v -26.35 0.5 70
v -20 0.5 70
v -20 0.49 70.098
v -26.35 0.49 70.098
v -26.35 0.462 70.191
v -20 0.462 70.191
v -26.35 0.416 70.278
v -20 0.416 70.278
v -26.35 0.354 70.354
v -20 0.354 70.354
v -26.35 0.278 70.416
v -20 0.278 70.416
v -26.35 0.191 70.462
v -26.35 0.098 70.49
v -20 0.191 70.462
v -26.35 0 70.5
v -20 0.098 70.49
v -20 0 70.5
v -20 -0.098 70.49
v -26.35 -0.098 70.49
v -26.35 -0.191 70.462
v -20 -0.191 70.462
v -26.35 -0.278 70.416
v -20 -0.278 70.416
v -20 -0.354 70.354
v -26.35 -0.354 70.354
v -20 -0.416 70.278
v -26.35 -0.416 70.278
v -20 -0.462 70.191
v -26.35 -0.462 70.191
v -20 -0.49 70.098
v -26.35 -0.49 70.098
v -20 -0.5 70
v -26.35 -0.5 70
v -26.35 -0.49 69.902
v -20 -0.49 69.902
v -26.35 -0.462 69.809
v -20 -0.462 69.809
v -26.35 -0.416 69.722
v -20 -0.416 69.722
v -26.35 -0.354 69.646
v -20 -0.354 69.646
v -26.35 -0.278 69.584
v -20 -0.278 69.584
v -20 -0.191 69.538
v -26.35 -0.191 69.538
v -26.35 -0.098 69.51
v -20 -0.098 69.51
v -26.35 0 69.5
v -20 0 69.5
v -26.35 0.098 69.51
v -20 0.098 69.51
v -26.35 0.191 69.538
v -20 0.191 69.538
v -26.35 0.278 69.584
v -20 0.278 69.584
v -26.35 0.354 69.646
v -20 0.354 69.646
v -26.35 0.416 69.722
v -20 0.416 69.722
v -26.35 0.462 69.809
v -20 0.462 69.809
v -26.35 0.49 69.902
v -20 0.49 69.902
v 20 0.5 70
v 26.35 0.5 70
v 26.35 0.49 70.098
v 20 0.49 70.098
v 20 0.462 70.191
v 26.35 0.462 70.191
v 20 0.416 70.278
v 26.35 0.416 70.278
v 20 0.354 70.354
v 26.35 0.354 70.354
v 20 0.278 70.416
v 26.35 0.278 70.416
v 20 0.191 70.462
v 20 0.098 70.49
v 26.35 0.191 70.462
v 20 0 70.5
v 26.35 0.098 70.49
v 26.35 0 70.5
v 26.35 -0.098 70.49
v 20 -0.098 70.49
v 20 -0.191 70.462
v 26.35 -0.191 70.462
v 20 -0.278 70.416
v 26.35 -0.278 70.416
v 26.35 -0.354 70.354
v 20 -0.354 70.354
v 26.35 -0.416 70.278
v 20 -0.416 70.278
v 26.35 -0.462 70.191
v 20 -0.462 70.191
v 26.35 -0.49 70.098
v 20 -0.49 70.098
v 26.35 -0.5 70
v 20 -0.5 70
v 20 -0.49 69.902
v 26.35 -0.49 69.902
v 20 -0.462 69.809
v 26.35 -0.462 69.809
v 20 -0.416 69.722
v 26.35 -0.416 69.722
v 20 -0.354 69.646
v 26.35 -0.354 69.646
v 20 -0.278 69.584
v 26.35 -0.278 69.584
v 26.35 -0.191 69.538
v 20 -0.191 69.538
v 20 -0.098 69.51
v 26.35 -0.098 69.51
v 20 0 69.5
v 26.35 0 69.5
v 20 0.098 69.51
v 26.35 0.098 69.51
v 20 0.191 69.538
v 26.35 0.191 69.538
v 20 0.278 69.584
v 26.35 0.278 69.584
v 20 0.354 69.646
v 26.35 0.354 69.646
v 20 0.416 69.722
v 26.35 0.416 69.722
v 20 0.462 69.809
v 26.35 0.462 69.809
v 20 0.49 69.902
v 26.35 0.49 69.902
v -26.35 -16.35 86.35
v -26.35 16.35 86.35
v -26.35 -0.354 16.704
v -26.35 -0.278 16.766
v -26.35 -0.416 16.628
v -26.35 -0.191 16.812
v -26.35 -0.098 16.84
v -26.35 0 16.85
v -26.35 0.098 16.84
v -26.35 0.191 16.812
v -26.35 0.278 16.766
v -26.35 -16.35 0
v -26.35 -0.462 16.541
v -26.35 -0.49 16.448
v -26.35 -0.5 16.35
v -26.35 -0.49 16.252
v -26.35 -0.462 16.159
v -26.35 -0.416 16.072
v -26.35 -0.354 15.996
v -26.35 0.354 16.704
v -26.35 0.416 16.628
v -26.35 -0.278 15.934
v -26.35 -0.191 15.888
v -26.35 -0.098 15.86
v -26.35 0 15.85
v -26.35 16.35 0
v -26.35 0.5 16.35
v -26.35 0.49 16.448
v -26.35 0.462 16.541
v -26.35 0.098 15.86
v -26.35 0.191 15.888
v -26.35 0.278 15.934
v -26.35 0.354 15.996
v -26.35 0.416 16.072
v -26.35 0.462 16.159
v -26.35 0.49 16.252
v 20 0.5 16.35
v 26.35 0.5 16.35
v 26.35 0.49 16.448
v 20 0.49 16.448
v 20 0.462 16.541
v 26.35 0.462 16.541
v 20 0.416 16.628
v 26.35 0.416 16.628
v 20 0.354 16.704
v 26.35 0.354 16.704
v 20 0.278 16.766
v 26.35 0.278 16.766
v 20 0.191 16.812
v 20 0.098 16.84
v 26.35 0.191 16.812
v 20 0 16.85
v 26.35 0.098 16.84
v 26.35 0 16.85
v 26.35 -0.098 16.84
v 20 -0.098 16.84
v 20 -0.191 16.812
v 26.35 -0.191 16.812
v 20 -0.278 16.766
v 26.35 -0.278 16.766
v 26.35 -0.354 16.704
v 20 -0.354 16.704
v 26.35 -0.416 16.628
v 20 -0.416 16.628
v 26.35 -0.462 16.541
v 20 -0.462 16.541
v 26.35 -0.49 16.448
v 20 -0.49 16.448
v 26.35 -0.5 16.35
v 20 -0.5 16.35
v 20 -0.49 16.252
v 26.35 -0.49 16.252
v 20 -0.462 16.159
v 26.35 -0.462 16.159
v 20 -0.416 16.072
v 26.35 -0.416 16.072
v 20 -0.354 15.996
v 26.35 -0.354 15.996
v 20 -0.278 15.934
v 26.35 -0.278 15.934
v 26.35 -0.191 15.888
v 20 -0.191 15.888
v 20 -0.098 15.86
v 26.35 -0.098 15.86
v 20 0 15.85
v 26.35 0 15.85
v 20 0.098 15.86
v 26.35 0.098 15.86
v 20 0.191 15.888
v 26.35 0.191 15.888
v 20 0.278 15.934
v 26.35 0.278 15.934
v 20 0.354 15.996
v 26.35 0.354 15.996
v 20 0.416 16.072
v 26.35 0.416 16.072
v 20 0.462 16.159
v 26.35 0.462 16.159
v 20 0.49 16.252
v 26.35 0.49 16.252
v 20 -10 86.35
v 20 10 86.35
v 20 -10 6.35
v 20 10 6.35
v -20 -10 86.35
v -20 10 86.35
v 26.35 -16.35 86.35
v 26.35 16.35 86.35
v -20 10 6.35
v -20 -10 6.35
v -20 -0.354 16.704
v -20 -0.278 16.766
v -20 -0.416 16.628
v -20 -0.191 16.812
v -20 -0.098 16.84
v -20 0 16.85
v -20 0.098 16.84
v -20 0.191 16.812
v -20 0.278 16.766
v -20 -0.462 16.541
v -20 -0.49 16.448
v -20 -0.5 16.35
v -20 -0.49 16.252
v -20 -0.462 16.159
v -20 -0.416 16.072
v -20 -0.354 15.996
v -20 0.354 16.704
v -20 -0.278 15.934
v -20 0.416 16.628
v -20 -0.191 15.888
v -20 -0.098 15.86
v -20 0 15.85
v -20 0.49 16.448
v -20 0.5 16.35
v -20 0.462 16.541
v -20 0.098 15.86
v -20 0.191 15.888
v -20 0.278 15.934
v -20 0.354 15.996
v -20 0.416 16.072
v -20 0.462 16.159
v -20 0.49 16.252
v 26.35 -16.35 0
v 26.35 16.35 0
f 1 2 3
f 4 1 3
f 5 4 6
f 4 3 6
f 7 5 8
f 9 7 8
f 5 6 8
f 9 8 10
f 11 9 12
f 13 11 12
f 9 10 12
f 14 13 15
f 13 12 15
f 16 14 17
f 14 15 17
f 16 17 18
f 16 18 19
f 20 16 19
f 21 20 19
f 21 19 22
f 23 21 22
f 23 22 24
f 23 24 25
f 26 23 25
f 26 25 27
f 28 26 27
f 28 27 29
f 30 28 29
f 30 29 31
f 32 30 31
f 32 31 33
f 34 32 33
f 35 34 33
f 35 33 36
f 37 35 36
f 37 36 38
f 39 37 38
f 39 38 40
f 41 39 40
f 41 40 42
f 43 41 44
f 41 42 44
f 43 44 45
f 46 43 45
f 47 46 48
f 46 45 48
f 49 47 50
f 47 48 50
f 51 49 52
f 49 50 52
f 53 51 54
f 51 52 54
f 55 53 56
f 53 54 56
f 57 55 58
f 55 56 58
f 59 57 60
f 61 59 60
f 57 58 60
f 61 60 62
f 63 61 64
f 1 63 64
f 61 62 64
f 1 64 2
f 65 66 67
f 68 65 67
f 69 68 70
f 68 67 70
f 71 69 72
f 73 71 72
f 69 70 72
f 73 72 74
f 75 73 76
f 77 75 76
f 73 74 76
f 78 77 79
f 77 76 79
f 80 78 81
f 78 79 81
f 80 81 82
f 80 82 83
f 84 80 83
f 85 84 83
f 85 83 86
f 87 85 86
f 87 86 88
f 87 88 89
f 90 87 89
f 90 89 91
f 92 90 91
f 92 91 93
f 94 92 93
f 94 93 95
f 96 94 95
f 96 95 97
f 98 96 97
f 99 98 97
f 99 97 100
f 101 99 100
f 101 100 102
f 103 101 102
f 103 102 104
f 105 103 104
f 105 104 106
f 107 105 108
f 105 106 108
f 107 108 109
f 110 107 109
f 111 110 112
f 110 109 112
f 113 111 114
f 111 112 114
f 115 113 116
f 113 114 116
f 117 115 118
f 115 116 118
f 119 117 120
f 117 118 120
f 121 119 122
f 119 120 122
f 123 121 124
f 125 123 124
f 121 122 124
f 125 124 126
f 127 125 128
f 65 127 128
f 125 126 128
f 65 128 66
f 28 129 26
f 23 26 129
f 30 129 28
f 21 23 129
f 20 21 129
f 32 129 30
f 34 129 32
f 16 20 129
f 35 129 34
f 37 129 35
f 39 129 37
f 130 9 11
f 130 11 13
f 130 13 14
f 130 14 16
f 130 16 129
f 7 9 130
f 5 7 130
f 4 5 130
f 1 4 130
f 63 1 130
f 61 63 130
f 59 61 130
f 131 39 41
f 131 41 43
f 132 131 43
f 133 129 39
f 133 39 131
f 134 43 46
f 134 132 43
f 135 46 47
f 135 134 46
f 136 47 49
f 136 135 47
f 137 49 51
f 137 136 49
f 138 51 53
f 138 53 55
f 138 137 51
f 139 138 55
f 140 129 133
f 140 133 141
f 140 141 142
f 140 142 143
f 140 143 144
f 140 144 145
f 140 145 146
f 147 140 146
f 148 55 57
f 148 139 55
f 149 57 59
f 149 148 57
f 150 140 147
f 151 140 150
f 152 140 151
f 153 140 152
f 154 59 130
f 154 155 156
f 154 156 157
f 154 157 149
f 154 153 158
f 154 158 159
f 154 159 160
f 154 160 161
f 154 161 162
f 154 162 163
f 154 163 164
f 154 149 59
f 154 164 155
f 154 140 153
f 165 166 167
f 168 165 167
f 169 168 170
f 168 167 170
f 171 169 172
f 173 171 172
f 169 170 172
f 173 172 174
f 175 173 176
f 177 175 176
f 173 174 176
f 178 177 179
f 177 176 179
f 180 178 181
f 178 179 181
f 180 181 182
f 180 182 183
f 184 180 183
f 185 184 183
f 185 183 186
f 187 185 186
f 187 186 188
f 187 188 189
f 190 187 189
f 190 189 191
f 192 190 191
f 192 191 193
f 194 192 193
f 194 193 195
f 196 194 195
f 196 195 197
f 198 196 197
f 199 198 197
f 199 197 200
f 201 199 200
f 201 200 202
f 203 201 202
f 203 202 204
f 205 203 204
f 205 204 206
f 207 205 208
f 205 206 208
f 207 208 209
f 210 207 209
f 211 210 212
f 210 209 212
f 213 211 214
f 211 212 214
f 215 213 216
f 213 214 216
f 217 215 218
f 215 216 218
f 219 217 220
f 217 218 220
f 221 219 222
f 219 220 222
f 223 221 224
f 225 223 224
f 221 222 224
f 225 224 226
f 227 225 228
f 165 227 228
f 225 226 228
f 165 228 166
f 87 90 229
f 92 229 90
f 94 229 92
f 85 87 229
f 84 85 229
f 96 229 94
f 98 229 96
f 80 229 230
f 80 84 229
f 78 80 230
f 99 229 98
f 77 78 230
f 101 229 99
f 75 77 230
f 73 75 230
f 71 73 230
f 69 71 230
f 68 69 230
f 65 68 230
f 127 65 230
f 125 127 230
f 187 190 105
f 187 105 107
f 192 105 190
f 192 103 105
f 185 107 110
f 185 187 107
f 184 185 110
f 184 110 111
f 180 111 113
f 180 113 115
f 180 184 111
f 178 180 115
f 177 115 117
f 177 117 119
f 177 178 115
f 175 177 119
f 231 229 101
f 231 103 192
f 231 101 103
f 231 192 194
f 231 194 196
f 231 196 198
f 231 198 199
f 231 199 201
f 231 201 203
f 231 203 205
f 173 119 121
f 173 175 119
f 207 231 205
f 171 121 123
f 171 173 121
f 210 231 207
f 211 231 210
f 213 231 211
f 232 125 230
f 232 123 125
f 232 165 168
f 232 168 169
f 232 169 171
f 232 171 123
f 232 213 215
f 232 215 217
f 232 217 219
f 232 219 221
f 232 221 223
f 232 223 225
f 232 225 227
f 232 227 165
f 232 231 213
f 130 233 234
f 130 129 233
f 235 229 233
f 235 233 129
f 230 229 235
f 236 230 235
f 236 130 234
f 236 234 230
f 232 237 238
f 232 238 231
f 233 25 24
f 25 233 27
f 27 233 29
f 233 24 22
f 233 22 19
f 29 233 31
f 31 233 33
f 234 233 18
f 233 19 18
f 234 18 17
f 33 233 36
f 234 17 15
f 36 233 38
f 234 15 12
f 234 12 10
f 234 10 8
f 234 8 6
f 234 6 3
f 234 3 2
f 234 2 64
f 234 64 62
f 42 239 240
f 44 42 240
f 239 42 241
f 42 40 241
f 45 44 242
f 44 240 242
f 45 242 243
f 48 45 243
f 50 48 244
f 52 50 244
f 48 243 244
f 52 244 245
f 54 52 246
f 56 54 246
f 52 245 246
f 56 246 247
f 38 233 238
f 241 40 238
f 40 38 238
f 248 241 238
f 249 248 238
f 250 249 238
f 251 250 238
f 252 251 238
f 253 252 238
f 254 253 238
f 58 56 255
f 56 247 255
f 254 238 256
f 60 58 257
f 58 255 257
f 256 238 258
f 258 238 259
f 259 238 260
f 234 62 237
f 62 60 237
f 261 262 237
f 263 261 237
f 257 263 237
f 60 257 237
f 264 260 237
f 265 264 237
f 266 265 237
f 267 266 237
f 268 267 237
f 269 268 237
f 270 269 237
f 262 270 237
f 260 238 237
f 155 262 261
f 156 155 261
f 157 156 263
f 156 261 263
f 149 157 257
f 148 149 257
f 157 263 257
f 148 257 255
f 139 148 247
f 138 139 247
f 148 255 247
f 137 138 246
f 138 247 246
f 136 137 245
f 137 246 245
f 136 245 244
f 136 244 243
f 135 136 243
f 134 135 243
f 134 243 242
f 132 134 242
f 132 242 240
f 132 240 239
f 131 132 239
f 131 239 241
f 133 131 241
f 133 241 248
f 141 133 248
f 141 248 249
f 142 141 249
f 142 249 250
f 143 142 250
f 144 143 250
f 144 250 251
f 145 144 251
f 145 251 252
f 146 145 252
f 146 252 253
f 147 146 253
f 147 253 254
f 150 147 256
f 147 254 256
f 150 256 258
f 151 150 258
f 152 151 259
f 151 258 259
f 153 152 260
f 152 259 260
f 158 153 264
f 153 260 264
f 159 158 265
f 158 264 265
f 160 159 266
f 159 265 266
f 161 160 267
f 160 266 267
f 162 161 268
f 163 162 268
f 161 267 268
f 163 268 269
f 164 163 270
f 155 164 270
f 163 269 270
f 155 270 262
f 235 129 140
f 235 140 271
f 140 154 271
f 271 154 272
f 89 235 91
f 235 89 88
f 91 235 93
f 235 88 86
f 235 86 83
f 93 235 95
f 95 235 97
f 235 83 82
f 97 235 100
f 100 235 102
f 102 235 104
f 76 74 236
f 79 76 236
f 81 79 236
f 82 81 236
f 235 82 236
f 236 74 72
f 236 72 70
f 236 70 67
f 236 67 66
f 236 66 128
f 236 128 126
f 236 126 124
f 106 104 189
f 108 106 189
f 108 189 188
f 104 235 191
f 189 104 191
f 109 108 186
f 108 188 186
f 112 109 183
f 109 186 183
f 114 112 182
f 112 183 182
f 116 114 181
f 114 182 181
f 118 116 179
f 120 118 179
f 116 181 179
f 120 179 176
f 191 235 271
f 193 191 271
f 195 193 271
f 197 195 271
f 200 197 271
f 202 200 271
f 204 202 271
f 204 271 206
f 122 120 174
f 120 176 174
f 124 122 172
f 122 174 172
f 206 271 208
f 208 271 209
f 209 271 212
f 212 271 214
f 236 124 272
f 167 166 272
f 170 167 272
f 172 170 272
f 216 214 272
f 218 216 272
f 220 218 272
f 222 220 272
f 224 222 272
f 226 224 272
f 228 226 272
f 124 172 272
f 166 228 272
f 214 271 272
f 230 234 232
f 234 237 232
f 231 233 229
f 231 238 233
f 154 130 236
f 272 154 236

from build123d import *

# Parameters (mm, degrees)
F0_W     = 52.7
F0_H     = 32.7
F1_DEPTH = 86.35
F2_T     = -6.35
F4_D     = 1
F5_D     = 1


with BuildPart() as f1:
    # F0 (on Top) → F1 (new body)
    with BuildSketch(Plane.XY):
        Rectangle(F0_W, F0_H)
    extrude(amount=F1_DEPTH)

    # F2
    f2_openings = [f1.faces().sort_by_distance(p)[0] for p in [
        (0, 0, 86.35),
    ]]
    offset(amount=F2_T, openings=f2_openings)

    # F4 (through all)
    with Locations(Plane(origin=(-26.35, 0, 0), x_dir=(0, -1, 0), z_dir=(-1, 0, 0))):
        with Locations((0, 70)):
            Hole(F4_D / 2)

    # F5 (through all)
    with Locations(Plane(origin=(-26.35, 0, 0), x_dir=(0, -1, 0), z_dir=(-1, 0, 0))):
        with Locations((0, 16.35)):
            Hole(F5_D / 2)


solid = f1.part
